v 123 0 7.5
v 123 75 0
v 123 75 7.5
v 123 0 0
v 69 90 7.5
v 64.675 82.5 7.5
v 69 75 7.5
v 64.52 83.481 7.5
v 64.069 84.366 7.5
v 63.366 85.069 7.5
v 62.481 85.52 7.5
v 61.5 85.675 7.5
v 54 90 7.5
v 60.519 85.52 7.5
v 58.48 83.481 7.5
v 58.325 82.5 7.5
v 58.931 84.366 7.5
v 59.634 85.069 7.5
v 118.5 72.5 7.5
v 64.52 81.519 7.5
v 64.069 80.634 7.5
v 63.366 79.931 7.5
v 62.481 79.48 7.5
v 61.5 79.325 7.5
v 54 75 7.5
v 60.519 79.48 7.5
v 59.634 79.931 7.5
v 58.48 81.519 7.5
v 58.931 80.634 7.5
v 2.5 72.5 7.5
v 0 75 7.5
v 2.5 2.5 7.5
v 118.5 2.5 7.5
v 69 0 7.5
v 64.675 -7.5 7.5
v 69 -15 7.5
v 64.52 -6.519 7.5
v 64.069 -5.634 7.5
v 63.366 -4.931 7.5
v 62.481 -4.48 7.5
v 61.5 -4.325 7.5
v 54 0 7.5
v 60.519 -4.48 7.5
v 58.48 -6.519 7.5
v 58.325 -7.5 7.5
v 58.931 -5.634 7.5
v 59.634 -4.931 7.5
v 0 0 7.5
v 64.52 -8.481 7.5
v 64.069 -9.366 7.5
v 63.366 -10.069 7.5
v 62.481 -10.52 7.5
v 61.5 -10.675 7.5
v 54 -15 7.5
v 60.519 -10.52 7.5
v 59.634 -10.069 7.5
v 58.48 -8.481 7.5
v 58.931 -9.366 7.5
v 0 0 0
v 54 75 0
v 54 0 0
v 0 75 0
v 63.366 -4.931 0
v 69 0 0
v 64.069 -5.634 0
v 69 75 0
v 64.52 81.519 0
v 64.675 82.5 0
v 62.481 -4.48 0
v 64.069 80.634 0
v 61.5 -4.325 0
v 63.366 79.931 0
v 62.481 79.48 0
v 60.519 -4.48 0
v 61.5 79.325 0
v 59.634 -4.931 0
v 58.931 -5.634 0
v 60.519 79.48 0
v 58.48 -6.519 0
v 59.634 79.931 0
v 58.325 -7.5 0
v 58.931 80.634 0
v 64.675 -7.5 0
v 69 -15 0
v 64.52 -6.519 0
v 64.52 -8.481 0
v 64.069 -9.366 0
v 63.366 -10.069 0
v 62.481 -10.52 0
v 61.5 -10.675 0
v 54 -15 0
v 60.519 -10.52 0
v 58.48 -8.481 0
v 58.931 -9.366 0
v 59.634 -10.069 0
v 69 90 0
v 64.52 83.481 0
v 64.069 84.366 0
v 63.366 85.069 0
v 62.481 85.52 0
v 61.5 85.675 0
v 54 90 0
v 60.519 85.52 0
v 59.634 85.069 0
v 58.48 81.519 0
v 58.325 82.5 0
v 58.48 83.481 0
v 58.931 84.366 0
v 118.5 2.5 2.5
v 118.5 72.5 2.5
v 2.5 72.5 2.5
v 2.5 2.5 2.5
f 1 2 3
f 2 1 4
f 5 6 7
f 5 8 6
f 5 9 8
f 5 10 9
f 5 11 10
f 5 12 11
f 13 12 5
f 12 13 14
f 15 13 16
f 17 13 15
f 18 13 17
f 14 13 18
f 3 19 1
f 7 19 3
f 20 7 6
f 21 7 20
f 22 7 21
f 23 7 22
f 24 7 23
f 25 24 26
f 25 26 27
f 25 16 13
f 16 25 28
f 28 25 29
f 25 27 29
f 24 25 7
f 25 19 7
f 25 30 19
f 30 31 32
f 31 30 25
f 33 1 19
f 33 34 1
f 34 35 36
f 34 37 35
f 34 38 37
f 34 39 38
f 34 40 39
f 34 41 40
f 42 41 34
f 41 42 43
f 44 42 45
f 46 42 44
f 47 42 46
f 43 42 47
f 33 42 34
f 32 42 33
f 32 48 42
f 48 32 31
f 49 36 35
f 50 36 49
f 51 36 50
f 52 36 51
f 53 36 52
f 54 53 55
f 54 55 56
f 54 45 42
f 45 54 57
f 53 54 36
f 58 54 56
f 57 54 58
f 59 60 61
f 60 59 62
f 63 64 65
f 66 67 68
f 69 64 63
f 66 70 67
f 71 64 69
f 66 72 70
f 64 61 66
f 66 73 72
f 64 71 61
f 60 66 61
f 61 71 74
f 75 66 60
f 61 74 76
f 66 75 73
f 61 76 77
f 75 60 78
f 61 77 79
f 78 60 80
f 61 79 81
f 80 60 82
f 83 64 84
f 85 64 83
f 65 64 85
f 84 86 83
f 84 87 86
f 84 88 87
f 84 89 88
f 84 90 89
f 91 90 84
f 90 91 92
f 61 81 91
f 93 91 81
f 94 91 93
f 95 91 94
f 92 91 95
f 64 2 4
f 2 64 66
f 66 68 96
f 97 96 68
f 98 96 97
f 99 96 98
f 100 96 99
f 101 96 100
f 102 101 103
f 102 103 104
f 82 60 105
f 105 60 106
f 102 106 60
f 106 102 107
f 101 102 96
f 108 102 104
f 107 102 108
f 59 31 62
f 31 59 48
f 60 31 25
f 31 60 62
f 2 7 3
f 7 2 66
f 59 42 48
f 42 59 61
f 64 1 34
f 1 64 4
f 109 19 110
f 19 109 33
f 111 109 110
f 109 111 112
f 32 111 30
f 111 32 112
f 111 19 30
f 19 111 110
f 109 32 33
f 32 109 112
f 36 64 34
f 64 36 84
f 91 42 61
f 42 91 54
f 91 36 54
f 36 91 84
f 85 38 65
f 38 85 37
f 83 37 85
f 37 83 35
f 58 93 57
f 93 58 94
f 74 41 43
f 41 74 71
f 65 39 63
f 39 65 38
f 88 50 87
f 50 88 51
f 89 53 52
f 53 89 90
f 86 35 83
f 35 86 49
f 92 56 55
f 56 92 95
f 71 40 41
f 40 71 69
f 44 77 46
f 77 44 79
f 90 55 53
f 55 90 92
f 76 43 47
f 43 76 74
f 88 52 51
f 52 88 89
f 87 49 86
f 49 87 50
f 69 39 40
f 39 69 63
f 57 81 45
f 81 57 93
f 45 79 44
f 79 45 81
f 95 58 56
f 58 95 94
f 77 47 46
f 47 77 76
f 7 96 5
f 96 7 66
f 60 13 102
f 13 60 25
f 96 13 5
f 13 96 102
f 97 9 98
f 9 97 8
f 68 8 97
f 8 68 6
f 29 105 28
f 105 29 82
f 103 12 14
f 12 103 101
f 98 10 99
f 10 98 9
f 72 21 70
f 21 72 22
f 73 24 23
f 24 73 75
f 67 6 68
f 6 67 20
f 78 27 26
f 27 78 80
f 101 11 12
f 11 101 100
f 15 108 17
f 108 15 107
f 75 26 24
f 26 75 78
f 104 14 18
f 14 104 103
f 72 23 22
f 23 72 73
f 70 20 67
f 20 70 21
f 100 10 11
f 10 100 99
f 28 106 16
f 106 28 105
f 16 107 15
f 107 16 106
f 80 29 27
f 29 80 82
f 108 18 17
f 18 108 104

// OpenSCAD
$fn = 20;

length=123;
width=75;
height=7.5;

difference(){
	cube([length,width,height]);
	translate([2.5, 2.5, 2.5])cube([116, 70, 6]);
}
module foot(){
	
	difference(){
		cube([15,15,7.5]);
		translate([7.5,7.5,-0.25])cylinder(d=6.35,8.5);
		
	}
}

translate([length/2 - 7.5, -15, 0])foot();
translate([length/2-7.5, width, 0])foot();

	
	
	
